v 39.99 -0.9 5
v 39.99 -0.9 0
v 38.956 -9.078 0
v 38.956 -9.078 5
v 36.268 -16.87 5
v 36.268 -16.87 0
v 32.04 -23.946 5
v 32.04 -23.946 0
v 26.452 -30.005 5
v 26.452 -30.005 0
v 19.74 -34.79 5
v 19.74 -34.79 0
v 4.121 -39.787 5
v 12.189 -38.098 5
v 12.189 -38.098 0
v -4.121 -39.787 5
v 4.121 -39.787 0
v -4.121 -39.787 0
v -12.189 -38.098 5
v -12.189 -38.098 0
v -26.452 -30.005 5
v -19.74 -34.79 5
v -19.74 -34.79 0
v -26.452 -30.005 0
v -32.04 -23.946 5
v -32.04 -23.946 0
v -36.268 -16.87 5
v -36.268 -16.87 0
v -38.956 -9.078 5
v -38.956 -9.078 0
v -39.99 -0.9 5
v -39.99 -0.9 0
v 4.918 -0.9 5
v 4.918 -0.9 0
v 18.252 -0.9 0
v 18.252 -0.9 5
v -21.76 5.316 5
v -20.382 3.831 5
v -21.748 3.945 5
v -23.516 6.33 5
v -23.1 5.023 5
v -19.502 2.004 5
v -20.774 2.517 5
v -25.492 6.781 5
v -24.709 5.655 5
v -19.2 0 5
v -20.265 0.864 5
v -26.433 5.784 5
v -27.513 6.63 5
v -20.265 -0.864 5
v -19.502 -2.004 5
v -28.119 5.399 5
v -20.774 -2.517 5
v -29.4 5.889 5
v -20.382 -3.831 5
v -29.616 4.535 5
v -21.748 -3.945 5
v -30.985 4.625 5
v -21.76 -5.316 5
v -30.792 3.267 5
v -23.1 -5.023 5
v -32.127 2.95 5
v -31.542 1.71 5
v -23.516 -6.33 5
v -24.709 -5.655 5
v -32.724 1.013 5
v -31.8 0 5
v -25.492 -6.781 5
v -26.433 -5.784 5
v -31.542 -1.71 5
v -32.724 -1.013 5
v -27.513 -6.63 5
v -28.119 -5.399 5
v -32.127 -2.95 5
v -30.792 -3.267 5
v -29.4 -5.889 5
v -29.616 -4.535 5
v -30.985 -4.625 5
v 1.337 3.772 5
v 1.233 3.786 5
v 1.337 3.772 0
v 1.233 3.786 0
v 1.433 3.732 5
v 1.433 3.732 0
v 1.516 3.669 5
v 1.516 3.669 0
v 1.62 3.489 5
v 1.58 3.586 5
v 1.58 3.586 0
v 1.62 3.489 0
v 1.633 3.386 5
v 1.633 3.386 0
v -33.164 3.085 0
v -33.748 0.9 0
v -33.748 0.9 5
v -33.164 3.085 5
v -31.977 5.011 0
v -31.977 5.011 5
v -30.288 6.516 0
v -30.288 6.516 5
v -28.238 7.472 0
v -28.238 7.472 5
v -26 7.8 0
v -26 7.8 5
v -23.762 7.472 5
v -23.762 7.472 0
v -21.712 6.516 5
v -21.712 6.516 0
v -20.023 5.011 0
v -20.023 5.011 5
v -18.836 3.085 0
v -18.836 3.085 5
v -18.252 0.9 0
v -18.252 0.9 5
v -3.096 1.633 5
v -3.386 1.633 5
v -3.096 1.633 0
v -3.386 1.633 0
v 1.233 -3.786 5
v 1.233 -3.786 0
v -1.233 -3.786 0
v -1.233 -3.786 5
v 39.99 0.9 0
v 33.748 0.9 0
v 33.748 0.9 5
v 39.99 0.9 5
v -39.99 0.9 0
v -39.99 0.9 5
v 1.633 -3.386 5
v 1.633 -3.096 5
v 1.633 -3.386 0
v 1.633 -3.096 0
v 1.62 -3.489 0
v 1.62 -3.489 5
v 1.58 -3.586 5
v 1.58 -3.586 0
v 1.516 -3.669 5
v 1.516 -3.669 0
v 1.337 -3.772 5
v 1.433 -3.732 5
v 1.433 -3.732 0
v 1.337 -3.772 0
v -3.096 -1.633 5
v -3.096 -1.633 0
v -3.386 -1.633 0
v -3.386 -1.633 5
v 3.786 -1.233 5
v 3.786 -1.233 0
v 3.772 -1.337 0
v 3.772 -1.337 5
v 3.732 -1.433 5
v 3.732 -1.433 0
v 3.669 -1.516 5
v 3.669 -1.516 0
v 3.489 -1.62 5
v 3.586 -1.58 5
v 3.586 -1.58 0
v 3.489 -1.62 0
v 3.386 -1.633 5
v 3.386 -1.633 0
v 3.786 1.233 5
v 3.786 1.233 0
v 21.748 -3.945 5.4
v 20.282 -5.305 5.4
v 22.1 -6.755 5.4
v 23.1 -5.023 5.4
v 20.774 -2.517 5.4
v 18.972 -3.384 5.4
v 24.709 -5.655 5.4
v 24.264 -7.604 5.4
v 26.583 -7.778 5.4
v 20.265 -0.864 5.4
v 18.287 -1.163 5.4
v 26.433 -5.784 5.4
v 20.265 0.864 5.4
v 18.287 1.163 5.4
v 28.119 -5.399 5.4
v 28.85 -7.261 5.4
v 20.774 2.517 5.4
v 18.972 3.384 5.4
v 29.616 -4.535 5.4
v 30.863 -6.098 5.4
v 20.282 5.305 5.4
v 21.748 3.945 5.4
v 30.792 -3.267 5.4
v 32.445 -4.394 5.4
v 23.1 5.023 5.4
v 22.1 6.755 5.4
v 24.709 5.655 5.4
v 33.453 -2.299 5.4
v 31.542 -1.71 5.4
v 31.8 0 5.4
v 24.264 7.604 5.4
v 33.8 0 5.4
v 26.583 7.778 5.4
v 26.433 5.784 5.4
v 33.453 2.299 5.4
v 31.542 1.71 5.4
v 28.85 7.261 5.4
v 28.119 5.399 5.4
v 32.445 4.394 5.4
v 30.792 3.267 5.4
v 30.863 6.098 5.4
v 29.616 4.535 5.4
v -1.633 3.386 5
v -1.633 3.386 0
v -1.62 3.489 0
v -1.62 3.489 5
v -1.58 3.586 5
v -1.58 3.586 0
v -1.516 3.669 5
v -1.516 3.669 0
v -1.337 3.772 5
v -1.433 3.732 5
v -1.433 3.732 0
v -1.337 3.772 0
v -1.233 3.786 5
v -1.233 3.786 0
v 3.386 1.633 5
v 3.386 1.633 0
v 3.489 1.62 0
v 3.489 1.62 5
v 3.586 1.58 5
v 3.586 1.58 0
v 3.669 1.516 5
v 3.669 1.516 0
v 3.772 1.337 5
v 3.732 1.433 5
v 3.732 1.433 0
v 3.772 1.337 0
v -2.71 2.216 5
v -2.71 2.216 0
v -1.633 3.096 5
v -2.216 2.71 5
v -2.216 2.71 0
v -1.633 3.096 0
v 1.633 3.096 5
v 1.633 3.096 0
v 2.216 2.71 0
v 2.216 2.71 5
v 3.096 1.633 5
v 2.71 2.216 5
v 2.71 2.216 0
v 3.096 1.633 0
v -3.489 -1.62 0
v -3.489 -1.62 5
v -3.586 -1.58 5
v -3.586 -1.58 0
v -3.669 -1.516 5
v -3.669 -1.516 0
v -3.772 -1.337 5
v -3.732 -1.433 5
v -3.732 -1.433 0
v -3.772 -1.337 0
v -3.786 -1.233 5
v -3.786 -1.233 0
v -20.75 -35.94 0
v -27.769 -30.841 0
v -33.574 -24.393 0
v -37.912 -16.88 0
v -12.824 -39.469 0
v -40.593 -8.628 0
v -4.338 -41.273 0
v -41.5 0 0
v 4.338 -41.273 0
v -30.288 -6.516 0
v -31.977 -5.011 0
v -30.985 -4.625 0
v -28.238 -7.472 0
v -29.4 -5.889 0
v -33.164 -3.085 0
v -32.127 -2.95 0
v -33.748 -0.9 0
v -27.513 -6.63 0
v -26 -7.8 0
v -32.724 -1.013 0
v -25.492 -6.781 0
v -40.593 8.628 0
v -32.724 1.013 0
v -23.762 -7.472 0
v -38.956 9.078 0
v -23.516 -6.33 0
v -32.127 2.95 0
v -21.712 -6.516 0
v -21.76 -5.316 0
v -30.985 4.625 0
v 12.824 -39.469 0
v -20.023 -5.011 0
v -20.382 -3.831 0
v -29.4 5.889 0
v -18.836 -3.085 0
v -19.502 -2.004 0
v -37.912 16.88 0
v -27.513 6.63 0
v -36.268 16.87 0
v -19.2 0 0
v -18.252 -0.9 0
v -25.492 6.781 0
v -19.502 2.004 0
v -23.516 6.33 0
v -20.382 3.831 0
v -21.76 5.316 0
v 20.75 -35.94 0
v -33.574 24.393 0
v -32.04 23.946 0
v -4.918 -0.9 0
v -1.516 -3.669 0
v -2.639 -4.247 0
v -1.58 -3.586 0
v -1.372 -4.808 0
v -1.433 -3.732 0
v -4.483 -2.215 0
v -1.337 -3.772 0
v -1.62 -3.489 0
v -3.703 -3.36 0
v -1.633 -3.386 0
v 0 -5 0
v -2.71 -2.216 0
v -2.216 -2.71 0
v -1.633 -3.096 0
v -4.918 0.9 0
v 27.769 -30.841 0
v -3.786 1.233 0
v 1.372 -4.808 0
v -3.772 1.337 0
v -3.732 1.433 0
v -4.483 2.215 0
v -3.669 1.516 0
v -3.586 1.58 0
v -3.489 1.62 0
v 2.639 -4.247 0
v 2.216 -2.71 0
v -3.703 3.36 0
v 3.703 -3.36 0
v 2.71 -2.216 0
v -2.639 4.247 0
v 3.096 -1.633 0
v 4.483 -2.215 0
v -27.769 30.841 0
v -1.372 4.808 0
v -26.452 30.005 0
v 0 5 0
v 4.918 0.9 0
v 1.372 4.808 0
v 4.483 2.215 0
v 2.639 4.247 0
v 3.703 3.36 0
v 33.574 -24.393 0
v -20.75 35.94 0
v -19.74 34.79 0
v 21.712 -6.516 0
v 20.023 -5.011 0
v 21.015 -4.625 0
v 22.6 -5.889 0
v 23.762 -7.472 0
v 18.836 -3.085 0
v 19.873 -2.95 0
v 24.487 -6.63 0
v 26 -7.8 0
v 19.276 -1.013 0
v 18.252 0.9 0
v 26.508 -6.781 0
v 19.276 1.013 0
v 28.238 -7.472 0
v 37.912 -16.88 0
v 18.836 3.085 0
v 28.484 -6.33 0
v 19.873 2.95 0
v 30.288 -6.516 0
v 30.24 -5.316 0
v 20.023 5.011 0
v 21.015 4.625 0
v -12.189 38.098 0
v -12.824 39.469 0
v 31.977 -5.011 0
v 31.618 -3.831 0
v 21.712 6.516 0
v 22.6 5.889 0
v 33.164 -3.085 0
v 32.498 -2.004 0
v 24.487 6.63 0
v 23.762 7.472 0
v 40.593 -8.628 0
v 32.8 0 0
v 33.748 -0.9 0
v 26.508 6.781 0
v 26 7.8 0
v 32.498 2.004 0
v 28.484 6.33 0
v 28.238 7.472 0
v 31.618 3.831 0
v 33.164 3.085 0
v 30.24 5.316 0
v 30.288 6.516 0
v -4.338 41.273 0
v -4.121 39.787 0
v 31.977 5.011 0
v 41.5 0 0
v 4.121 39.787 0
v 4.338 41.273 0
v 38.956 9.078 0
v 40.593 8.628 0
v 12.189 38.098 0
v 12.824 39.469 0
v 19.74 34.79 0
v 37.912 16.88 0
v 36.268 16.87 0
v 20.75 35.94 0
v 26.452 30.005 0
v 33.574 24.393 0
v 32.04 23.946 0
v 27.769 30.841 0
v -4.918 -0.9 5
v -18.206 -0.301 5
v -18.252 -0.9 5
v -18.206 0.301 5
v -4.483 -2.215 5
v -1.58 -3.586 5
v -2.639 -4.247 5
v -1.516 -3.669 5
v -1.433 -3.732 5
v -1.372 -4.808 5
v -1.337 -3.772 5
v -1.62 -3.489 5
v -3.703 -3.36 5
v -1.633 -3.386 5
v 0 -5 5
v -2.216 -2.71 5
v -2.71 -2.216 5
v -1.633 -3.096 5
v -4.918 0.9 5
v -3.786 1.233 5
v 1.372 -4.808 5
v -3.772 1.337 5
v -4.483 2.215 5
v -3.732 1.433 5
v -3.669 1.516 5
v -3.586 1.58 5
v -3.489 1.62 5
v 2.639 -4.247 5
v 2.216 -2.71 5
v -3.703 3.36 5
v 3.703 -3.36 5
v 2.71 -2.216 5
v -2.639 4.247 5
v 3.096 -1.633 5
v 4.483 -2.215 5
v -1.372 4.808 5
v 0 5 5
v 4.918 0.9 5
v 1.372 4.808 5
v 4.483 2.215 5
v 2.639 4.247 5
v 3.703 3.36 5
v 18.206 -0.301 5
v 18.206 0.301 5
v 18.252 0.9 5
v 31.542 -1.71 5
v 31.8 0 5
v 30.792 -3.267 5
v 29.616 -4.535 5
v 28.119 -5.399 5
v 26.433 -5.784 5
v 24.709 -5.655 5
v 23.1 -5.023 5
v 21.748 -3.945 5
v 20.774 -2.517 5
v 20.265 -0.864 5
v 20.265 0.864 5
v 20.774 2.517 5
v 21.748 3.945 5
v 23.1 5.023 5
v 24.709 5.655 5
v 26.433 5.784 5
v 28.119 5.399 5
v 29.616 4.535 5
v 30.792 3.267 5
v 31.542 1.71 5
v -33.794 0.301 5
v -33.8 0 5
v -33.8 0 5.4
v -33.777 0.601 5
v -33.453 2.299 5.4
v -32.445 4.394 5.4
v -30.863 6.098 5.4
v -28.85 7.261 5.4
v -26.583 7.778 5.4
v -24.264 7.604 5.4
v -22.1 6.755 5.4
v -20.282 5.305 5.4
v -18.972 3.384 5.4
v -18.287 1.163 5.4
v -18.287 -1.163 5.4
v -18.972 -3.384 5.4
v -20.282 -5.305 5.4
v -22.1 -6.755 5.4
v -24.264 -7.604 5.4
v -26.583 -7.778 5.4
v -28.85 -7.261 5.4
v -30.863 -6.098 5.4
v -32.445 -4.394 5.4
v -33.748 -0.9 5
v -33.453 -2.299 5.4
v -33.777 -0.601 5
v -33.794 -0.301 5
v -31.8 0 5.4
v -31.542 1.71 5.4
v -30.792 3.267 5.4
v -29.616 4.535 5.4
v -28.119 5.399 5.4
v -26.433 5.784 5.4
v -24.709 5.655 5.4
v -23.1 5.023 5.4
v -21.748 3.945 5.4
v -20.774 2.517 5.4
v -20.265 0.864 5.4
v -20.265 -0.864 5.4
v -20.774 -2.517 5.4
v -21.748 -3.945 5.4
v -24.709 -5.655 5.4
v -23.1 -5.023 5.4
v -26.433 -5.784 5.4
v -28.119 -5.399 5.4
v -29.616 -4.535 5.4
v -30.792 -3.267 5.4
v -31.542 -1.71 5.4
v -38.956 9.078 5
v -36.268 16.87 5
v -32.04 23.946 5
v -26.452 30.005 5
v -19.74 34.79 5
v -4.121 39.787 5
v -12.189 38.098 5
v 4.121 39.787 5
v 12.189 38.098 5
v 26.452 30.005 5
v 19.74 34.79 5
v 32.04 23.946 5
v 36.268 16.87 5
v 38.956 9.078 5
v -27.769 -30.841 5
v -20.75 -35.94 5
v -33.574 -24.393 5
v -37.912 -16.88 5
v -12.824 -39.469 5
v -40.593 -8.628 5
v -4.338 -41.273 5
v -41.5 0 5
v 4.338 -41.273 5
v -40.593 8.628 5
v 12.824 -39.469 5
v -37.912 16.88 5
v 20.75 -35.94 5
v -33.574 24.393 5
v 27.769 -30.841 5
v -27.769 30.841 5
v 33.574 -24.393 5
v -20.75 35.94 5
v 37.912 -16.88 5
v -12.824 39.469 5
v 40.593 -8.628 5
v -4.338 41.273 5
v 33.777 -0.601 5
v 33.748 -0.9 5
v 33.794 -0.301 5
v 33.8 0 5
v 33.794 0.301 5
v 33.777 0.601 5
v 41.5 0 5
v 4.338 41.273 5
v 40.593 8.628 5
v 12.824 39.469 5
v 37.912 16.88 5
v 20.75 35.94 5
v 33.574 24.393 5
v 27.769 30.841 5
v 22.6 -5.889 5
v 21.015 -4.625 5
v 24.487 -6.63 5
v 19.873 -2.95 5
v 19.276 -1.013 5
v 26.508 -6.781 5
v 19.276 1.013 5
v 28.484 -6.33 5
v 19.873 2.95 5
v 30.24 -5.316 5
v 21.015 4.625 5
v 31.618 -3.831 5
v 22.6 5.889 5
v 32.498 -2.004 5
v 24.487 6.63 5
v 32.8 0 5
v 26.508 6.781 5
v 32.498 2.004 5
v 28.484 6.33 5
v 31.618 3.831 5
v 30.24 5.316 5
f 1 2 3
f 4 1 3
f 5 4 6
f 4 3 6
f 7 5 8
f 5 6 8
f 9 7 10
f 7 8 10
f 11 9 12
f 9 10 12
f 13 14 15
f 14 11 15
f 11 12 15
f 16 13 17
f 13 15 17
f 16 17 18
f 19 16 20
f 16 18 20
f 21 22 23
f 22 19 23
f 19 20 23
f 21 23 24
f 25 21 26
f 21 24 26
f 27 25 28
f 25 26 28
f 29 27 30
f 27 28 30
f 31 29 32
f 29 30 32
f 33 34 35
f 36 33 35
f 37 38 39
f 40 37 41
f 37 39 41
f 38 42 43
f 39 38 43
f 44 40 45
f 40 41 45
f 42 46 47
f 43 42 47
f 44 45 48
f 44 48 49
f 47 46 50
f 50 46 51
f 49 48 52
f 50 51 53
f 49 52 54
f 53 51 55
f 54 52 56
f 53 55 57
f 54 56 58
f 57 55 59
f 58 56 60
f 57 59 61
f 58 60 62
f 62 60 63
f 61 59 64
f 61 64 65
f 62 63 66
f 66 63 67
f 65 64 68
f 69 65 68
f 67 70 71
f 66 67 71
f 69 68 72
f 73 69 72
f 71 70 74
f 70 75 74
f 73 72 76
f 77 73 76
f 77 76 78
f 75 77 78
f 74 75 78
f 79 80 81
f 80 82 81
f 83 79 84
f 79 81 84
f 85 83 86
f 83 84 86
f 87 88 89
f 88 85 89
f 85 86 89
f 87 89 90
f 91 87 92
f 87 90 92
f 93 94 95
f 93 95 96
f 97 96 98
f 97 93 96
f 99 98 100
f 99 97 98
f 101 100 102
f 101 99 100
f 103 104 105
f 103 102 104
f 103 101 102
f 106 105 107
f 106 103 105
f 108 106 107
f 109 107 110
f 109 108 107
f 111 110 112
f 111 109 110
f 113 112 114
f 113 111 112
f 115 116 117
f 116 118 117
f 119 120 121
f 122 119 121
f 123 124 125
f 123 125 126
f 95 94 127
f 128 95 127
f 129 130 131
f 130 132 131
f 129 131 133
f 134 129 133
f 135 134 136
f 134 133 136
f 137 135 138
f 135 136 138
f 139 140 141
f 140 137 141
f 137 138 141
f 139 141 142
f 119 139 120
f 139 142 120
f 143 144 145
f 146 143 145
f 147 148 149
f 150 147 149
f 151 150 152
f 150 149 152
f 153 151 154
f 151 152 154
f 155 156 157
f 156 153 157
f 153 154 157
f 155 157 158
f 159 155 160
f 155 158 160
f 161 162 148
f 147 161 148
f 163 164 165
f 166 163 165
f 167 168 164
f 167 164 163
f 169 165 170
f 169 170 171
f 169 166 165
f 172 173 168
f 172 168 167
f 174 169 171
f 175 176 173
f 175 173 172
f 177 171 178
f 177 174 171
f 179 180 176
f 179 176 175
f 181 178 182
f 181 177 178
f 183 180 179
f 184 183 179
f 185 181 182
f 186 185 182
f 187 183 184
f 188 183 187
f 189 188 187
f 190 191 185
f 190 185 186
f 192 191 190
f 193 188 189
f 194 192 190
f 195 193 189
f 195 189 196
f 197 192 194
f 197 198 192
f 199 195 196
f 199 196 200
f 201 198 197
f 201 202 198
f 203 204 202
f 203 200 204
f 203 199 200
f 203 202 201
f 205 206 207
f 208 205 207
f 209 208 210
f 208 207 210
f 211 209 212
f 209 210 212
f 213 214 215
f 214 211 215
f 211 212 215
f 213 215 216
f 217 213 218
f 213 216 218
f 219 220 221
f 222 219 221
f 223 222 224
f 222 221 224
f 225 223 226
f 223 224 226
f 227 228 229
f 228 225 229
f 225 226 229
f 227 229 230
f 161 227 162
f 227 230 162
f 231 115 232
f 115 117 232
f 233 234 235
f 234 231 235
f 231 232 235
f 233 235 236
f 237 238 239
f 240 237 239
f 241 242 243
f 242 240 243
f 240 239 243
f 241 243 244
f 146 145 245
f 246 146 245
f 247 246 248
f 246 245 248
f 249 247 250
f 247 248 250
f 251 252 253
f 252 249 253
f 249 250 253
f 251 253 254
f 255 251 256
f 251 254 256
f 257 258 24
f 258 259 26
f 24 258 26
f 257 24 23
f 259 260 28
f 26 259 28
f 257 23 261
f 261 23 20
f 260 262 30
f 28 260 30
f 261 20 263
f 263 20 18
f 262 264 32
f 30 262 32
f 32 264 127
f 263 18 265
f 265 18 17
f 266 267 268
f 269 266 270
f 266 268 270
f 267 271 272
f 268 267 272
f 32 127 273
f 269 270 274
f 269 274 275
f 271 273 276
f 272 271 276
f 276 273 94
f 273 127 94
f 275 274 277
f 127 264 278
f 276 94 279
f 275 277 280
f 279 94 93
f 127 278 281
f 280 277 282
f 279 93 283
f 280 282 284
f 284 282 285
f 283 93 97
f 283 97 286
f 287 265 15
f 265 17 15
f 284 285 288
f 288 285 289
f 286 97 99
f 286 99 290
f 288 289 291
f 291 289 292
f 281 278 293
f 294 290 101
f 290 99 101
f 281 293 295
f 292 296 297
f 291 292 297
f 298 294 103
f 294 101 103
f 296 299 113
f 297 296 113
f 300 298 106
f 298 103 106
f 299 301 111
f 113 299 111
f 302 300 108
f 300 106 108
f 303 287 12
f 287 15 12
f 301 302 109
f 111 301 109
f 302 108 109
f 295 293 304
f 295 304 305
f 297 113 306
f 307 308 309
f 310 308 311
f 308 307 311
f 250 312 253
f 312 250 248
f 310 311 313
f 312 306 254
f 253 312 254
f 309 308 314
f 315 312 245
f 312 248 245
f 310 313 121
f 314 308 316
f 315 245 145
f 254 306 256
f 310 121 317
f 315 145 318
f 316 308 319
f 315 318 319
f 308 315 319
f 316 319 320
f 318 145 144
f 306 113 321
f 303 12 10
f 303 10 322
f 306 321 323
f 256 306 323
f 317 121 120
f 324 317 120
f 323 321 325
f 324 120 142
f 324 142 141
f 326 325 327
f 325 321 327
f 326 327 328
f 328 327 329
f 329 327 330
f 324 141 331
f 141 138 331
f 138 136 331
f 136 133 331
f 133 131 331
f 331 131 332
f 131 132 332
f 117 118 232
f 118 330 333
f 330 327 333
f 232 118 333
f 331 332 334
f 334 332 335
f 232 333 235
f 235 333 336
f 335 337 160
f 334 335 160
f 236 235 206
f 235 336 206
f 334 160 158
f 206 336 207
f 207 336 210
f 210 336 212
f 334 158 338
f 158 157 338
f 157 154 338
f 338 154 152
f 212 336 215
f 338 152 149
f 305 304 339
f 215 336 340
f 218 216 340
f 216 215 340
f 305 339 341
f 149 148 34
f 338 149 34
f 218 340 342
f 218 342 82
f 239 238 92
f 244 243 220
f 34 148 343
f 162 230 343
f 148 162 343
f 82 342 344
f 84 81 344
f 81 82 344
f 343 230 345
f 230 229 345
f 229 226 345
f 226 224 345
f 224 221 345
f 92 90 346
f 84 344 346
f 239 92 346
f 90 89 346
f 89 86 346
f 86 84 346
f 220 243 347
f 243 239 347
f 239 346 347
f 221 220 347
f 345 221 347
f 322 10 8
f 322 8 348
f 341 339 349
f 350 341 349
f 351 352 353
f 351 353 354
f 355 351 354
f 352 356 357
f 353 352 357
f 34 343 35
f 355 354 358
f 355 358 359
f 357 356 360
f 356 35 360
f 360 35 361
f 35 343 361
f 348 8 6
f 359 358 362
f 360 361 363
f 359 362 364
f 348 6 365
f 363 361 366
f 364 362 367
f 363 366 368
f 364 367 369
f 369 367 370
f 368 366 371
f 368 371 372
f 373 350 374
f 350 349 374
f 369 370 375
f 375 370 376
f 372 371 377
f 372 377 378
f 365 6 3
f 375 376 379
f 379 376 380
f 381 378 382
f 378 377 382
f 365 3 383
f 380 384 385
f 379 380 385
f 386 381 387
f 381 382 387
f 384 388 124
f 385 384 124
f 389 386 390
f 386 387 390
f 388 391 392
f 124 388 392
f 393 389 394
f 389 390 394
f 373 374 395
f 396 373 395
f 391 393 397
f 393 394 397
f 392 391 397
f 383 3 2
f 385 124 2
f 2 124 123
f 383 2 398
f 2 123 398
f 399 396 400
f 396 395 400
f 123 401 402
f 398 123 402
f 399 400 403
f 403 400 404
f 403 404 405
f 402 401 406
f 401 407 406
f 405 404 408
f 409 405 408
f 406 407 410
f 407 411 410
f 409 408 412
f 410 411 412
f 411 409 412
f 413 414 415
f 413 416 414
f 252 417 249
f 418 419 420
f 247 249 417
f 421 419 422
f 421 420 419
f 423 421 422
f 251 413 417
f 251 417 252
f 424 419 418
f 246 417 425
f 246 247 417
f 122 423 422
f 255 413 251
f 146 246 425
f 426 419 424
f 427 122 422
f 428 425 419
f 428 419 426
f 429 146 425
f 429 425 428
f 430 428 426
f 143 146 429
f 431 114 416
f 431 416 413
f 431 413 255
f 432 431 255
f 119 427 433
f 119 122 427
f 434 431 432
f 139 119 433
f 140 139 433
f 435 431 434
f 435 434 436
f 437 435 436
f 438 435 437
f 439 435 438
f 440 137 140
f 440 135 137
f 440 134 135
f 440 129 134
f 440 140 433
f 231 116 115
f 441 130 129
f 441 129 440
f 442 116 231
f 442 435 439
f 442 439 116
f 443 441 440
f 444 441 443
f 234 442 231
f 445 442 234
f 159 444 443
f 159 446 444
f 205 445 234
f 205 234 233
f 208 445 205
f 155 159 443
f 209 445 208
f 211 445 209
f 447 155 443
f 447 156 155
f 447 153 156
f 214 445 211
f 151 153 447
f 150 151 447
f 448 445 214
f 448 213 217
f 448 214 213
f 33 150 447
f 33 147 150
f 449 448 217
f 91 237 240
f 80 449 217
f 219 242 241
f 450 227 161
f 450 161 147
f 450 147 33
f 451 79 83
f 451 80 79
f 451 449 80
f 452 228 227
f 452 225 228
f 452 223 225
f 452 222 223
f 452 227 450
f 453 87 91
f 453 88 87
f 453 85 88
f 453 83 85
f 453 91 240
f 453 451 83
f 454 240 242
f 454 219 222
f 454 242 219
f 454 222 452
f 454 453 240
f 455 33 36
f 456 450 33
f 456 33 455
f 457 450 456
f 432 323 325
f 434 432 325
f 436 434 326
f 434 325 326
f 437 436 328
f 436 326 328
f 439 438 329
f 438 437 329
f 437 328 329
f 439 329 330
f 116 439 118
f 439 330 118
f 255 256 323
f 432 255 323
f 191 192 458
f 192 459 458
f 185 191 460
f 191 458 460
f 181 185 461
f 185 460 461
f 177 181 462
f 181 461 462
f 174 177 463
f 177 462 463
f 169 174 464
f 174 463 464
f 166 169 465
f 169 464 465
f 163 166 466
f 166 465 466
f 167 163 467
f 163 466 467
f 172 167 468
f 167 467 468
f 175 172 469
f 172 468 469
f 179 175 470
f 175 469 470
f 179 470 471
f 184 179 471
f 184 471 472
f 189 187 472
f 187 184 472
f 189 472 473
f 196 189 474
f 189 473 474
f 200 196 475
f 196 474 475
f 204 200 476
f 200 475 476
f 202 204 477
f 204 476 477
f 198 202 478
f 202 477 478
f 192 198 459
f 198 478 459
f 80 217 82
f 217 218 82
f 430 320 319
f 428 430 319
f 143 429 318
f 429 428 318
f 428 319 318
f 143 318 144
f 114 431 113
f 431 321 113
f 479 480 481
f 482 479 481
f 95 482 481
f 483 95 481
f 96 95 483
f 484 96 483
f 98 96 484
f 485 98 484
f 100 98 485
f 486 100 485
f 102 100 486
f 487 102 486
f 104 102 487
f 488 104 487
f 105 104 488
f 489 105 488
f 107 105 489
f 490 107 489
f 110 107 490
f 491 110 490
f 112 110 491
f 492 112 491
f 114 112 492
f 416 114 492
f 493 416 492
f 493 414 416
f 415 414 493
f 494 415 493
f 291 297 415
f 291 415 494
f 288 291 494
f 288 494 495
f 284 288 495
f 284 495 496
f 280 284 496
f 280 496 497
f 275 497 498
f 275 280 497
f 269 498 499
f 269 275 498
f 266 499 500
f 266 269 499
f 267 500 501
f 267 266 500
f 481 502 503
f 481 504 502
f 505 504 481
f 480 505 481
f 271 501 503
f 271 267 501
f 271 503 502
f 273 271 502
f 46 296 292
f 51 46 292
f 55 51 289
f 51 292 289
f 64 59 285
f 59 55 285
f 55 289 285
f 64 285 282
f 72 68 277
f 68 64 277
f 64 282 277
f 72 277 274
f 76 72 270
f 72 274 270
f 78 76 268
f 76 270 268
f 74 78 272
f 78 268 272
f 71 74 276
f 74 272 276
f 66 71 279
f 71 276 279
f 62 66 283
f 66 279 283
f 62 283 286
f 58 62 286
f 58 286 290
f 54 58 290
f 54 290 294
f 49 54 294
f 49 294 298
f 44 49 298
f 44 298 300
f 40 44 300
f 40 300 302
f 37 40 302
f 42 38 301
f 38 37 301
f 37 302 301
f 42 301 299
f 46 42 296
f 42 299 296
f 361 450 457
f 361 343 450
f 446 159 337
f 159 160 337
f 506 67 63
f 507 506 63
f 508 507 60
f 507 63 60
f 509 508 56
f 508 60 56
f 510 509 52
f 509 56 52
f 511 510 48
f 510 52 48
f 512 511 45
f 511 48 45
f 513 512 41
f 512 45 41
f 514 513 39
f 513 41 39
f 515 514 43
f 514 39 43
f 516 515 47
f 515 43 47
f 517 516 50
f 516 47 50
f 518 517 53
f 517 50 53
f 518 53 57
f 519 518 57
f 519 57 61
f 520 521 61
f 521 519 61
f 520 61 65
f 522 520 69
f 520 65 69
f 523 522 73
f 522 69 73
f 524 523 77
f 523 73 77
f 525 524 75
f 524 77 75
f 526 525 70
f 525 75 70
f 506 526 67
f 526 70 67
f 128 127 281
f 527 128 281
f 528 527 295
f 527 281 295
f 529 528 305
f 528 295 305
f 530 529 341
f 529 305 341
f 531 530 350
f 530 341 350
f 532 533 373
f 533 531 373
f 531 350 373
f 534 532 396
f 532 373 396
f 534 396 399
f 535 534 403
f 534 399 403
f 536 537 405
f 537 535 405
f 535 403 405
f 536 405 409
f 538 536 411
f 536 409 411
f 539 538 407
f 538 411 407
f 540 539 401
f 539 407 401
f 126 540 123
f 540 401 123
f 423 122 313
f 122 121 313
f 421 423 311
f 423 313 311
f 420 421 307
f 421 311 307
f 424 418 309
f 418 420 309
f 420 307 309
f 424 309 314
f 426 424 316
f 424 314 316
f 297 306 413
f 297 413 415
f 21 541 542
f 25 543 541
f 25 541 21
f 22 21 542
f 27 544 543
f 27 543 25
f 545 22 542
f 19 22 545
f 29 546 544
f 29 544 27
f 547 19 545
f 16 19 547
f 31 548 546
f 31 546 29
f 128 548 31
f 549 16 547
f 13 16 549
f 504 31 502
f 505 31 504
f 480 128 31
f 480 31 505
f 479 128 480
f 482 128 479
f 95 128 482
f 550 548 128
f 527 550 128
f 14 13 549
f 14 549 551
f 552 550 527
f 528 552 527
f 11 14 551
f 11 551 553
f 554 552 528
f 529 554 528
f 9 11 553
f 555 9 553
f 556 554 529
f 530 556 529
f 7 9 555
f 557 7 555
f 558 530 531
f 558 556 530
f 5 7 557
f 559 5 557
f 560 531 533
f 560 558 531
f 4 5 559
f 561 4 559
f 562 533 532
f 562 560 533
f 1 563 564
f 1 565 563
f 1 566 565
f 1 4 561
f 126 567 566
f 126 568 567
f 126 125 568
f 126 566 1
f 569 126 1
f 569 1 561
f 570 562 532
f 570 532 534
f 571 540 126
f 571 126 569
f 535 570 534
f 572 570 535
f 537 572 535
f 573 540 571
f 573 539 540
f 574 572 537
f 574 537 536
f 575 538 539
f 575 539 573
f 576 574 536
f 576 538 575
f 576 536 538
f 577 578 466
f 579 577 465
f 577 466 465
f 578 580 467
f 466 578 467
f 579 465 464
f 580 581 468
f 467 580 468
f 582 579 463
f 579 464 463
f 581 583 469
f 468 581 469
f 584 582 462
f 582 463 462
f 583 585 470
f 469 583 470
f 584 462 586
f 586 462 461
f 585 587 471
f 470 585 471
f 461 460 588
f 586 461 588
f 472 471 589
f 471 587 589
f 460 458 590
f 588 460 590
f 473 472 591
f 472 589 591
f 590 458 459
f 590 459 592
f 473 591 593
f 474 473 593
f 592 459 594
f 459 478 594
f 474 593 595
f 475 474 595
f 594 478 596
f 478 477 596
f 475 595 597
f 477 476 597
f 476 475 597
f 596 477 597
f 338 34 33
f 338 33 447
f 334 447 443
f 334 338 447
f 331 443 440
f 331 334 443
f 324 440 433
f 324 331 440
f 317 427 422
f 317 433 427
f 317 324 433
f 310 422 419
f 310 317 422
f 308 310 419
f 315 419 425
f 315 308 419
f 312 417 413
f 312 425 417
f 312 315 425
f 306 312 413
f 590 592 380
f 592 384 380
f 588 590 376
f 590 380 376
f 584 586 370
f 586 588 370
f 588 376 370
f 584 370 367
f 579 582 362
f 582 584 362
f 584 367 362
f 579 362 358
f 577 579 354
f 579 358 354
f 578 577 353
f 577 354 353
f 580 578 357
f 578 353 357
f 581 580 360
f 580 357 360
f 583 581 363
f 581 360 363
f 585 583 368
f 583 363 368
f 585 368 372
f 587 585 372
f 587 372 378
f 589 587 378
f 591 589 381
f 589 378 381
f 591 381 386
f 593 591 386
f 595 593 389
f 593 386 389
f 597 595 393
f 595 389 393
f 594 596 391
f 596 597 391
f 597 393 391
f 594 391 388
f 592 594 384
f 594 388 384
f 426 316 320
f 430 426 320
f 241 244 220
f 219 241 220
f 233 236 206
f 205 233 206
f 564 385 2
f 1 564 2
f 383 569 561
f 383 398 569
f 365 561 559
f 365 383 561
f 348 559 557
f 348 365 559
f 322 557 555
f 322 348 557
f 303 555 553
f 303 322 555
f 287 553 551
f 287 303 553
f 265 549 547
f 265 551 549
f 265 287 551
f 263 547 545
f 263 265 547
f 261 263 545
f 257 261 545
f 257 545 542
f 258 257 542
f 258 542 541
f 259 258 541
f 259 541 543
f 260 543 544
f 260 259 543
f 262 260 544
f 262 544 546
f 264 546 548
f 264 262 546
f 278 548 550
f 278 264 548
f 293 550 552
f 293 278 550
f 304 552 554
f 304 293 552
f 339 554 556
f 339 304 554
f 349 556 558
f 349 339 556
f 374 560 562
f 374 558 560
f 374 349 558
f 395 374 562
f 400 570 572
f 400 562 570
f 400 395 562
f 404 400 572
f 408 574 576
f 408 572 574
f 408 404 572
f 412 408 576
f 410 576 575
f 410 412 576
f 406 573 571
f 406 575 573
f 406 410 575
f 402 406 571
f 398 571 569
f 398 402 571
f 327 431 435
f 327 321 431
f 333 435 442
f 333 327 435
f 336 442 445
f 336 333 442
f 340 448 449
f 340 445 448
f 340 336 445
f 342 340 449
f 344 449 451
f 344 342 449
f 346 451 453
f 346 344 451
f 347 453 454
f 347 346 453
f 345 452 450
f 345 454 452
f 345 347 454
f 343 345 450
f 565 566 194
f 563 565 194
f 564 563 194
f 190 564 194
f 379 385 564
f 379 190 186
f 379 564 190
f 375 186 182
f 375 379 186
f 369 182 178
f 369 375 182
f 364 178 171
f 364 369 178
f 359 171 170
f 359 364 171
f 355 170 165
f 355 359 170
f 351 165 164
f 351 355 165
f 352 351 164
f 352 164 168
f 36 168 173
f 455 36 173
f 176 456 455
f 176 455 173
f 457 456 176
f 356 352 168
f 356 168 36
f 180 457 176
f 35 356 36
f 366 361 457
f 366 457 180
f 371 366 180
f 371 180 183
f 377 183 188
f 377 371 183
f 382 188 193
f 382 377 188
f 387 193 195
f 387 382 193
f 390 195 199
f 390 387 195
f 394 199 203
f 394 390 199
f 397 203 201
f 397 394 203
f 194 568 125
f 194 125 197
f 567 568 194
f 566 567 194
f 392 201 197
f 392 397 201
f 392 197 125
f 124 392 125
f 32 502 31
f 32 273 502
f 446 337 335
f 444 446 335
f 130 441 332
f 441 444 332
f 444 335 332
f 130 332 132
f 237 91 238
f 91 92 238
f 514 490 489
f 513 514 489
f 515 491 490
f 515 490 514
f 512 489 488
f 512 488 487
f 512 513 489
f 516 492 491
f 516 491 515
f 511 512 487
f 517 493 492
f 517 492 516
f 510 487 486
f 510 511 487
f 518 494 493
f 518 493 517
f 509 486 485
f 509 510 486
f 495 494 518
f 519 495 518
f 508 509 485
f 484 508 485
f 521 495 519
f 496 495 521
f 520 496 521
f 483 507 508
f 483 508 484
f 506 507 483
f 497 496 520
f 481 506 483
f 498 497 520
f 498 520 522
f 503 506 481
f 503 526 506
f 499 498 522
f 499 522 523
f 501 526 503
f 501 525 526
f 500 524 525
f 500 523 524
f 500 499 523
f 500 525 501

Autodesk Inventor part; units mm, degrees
ref_plane "YZ Plane" through (0, 0, 0) normal (1, 0, 0) x (0, 1, 0)
ref_plane "XZ Plane" through (0, 0, 0) normal (0, 1, 0) x (-1, 0, 0)
ref_plane "XY Plane" through (0, 0, 0) normal (0, 0, 1) x (1, 0, 0)
sketch "Sketch1" plane through (0, 0, 0) normal (0, 0, 1) x (1, 0, 0)
  circle A0 centre (0, 0) radius 40
  circle A1 centre (0, 0) radius 41.5
  circle A2 centre (0, 0) radius 3.5
  circle A3 centre (0, 0) radius 5
  circle A4 centre (26, 0) radius 6.8
  circle A5 centre (26, 0) radius 7.8
  line L0 (0, 0) -> (43.8957, 0) construction
  line L1 (4.9183, 0.9) -> (18.2521, 0.9)
  line L2 (33.7479, 0.9) -> (39.9899, 0.9)
  line L3 (4.9183, -0.9) -> (18.2521, -0.9)
  line L4 (33.7479, -0.9) -> (39.9899, -0.9)
  line L5 (-4.9183, -0.9) -> (-18.2521, -0.9)
  line L6 (-4.9183, 0.9) -> (-18.2521, 0.9)
  circle A6 centre (-26, 0) radius 7.8
  circle A7 centre (-26, 0) radius 6.8
  line L7 (-33.7479, 0.9) -> (-39.9899, 0.9)
  line L8 (-33.7479, -0.9) -> (-39.9899, -0.9)
  line L9 (1.2333, -3.7857) -> (-1.2333, -3.7857)
  line L10 (-1.6333, -3.3857) -> (-1.6333, 3.3857)
  line L11 (-1.2333, 3.7857) -> (1.2333, 3.7857)
  line L12 (1.6333, 3.3857) -> (1.6333, -3.3857)
  line L13 (1.6333, -3.7857) -> (-1.6333, 3.7857) construction
  line L14 (-1.6333, -3.7857) -> (1.6333, 3.7857) construction
  arc A8 (-1.2333, 3.7857) -> (-1.6333, 3.3857) centre (-1.2333, 3.3857) ccw
  arc A9 (1.6333, 3.3857) -> (1.2333, 3.7857) centre (1.2333, 3.3857) ccw
  arc A10 (1.2333, -3.7857) -> (1.6333, -3.3857) centre (1.2333, -3.3857) ccw
  arc A11 (-1.6333, -3.3857) -> (-1.2333, -3.7857) centre (-1.2333, -3.3857) ccw
  line L15 (3.3857, -1.6333) -> (-3.3857, -1.6333)
  line L16 (-3.7857, -1.2333) -> (-3.7857, 1.2333)
  line L17 (-3.3857, 1.6333) -> (3.3857, 1.6333)
  line L18 (3.7857, 1.2333) -> (3.7857, -1.2333)
  line L19 (3.7857, -1.6333) -> (-3.7857, 1.6333) construction
  line L20 (-3.7857, -1.6333) -> (3.7857, 1.6333) construction
  arc A12 (-3.3857, 1.6333) -> (-3.7857, 1.2333) centre (-3.3857, 1.2333) ccw
  arc A13 (3.7857, 1.2333) -> (3.3857, 1.6333) centre (3.3857, 1.2333) ccw
  arc A14 (3.3857, -1.6333) -> (3.7857, -1.2333) centre (3.3857, -1.2333) ccw
  arc A15 (-3.7857, -1.2333) -> (-3.3857, -1.6333) centre (-3.3857, -1.2333) ccw
  point P0 (-4.9183, -0.9)
  point P1 (4.9183, -0.9)
  point P2 (-1.6333, -3.0955)
  point P3 (-1.6333, 3.0955)
  point P4 (1.6333, 3.0955)
  point P5 (1.6333, -3.0955)
  point P6 (-4.9183, 0.9)
  point P7 (-33.7479, 0.9)
  point P8 (-3.0955, -1.6333)
  point P9 (-3.0955, 1.6333)
  point P10 (3.0955, 1.6333)
  point P11 (3.0955, -1.6333)
  dimension "d0" = 80
  dimension "d3" = 10
  dimension "d1" = 83
  dimension "d2" = 7
  dimension "d4" = 13.6
  dimension "d5" = 26
  dimension "d6" = 15.6
  dimension "d10" = 0.9
  dimension "d11" = 0.9
  dimension "d14" = 360
  dimension "d16" = 7.5714
  dimension "d17" = 3.2667
  dimension "d18" = 0.4
  dimension "d29" = 7.5714
  dimension "d30" = 3.2667
  dimension "d31" = 0.4
extrude "Extrusion1" add sketch "Sketch1" along normal blind 5 contours A0 L4 A5 L2 | L7 A6 L8 A0 | A5 | A6 | A5 L3 A3 L1 | L6 A3 L5 A6 | A3 | A1
sketch "Sketch3" plane through (0, 0, 5) normal (0, 0, 1) x (1, 0, 0)
  circle A0 centre (26, 0) radius 6.8 projected
  circle A1 centre (26, 0) radius 5.8
  circle A2 centre (26, 0) radius 7.8
  point P0 (0, 0)
  dimension "d32" = 11.6
  dimension "d33" = 15.6
extrude "Extrusion3" add sketch "Sketch3" along normal blind 0.4 contours A0 | A2
pattern_circular "Circular Pattern1" count 2 over 360 about axis through (0, 0, 0) along (0, 0, 1) of "Extrusion3"
equation "\"d0\" = D_yttreRing_i"
equation "\"d3\" = D_axel + d_axelRing"
equation "\"d1\" = D_yttreRing_i + d_yttreRing"
equation "\"d2\" = D_axel"
equation "\"d4\" = D_magnet + d_toleransMagnetHållarRing"
equation "\"d5\" = l_magnetHållarRingFrånOrigo"
equation "\"d6\" = d_toleransMagnetHållarRing + D_magnet + d_magnetHållarRing"
equation "\"d10\" = 0.5 * d_stöttor"
equation "\"d11\" = 0.5 * d_stöttor"
equation "\"d18\" = r_filletAxel"
equation "\"d31\" = r_filletAxel"
equation "\"d19\" = h_höjdMagnetRotor"
equation "\"d32\" = D_magnet - d_magnetSkydd"
equation "\"d33\" = d_toleransMagnetHållarRing + D_magnet + d_magnetHållarRing"
equation "\"d34\" = h_magnetSkydd"
equation "\"D_yttreRing_i\" = 80"
equation "\"d_yttreRing\" = 3"
equation "\"D_magnet\" = 13"
equation "\"D_axel\" = 7"
equation "\"d_axelRing\" = 3"
equation "\"h_höjdMagnetRotor\" = 5"
equation "\"d_stöttor\" = 1.8"
equation "\"d_toleransMagnetHållarRing\" = 0.6"
equation "\"d_magnetHållarRing\" = 2"
equation "\"l_magnetHållarRingFrånOrigo\" = 26"
equation "\"r_filletAxel\" = 0.4"
equation "\"h_magnetSkydd\" = 0.4"
equation "\"d_magnetSkydd\" = 1.4"
properties part number "Magnet_rotor_parametriserad_02"
